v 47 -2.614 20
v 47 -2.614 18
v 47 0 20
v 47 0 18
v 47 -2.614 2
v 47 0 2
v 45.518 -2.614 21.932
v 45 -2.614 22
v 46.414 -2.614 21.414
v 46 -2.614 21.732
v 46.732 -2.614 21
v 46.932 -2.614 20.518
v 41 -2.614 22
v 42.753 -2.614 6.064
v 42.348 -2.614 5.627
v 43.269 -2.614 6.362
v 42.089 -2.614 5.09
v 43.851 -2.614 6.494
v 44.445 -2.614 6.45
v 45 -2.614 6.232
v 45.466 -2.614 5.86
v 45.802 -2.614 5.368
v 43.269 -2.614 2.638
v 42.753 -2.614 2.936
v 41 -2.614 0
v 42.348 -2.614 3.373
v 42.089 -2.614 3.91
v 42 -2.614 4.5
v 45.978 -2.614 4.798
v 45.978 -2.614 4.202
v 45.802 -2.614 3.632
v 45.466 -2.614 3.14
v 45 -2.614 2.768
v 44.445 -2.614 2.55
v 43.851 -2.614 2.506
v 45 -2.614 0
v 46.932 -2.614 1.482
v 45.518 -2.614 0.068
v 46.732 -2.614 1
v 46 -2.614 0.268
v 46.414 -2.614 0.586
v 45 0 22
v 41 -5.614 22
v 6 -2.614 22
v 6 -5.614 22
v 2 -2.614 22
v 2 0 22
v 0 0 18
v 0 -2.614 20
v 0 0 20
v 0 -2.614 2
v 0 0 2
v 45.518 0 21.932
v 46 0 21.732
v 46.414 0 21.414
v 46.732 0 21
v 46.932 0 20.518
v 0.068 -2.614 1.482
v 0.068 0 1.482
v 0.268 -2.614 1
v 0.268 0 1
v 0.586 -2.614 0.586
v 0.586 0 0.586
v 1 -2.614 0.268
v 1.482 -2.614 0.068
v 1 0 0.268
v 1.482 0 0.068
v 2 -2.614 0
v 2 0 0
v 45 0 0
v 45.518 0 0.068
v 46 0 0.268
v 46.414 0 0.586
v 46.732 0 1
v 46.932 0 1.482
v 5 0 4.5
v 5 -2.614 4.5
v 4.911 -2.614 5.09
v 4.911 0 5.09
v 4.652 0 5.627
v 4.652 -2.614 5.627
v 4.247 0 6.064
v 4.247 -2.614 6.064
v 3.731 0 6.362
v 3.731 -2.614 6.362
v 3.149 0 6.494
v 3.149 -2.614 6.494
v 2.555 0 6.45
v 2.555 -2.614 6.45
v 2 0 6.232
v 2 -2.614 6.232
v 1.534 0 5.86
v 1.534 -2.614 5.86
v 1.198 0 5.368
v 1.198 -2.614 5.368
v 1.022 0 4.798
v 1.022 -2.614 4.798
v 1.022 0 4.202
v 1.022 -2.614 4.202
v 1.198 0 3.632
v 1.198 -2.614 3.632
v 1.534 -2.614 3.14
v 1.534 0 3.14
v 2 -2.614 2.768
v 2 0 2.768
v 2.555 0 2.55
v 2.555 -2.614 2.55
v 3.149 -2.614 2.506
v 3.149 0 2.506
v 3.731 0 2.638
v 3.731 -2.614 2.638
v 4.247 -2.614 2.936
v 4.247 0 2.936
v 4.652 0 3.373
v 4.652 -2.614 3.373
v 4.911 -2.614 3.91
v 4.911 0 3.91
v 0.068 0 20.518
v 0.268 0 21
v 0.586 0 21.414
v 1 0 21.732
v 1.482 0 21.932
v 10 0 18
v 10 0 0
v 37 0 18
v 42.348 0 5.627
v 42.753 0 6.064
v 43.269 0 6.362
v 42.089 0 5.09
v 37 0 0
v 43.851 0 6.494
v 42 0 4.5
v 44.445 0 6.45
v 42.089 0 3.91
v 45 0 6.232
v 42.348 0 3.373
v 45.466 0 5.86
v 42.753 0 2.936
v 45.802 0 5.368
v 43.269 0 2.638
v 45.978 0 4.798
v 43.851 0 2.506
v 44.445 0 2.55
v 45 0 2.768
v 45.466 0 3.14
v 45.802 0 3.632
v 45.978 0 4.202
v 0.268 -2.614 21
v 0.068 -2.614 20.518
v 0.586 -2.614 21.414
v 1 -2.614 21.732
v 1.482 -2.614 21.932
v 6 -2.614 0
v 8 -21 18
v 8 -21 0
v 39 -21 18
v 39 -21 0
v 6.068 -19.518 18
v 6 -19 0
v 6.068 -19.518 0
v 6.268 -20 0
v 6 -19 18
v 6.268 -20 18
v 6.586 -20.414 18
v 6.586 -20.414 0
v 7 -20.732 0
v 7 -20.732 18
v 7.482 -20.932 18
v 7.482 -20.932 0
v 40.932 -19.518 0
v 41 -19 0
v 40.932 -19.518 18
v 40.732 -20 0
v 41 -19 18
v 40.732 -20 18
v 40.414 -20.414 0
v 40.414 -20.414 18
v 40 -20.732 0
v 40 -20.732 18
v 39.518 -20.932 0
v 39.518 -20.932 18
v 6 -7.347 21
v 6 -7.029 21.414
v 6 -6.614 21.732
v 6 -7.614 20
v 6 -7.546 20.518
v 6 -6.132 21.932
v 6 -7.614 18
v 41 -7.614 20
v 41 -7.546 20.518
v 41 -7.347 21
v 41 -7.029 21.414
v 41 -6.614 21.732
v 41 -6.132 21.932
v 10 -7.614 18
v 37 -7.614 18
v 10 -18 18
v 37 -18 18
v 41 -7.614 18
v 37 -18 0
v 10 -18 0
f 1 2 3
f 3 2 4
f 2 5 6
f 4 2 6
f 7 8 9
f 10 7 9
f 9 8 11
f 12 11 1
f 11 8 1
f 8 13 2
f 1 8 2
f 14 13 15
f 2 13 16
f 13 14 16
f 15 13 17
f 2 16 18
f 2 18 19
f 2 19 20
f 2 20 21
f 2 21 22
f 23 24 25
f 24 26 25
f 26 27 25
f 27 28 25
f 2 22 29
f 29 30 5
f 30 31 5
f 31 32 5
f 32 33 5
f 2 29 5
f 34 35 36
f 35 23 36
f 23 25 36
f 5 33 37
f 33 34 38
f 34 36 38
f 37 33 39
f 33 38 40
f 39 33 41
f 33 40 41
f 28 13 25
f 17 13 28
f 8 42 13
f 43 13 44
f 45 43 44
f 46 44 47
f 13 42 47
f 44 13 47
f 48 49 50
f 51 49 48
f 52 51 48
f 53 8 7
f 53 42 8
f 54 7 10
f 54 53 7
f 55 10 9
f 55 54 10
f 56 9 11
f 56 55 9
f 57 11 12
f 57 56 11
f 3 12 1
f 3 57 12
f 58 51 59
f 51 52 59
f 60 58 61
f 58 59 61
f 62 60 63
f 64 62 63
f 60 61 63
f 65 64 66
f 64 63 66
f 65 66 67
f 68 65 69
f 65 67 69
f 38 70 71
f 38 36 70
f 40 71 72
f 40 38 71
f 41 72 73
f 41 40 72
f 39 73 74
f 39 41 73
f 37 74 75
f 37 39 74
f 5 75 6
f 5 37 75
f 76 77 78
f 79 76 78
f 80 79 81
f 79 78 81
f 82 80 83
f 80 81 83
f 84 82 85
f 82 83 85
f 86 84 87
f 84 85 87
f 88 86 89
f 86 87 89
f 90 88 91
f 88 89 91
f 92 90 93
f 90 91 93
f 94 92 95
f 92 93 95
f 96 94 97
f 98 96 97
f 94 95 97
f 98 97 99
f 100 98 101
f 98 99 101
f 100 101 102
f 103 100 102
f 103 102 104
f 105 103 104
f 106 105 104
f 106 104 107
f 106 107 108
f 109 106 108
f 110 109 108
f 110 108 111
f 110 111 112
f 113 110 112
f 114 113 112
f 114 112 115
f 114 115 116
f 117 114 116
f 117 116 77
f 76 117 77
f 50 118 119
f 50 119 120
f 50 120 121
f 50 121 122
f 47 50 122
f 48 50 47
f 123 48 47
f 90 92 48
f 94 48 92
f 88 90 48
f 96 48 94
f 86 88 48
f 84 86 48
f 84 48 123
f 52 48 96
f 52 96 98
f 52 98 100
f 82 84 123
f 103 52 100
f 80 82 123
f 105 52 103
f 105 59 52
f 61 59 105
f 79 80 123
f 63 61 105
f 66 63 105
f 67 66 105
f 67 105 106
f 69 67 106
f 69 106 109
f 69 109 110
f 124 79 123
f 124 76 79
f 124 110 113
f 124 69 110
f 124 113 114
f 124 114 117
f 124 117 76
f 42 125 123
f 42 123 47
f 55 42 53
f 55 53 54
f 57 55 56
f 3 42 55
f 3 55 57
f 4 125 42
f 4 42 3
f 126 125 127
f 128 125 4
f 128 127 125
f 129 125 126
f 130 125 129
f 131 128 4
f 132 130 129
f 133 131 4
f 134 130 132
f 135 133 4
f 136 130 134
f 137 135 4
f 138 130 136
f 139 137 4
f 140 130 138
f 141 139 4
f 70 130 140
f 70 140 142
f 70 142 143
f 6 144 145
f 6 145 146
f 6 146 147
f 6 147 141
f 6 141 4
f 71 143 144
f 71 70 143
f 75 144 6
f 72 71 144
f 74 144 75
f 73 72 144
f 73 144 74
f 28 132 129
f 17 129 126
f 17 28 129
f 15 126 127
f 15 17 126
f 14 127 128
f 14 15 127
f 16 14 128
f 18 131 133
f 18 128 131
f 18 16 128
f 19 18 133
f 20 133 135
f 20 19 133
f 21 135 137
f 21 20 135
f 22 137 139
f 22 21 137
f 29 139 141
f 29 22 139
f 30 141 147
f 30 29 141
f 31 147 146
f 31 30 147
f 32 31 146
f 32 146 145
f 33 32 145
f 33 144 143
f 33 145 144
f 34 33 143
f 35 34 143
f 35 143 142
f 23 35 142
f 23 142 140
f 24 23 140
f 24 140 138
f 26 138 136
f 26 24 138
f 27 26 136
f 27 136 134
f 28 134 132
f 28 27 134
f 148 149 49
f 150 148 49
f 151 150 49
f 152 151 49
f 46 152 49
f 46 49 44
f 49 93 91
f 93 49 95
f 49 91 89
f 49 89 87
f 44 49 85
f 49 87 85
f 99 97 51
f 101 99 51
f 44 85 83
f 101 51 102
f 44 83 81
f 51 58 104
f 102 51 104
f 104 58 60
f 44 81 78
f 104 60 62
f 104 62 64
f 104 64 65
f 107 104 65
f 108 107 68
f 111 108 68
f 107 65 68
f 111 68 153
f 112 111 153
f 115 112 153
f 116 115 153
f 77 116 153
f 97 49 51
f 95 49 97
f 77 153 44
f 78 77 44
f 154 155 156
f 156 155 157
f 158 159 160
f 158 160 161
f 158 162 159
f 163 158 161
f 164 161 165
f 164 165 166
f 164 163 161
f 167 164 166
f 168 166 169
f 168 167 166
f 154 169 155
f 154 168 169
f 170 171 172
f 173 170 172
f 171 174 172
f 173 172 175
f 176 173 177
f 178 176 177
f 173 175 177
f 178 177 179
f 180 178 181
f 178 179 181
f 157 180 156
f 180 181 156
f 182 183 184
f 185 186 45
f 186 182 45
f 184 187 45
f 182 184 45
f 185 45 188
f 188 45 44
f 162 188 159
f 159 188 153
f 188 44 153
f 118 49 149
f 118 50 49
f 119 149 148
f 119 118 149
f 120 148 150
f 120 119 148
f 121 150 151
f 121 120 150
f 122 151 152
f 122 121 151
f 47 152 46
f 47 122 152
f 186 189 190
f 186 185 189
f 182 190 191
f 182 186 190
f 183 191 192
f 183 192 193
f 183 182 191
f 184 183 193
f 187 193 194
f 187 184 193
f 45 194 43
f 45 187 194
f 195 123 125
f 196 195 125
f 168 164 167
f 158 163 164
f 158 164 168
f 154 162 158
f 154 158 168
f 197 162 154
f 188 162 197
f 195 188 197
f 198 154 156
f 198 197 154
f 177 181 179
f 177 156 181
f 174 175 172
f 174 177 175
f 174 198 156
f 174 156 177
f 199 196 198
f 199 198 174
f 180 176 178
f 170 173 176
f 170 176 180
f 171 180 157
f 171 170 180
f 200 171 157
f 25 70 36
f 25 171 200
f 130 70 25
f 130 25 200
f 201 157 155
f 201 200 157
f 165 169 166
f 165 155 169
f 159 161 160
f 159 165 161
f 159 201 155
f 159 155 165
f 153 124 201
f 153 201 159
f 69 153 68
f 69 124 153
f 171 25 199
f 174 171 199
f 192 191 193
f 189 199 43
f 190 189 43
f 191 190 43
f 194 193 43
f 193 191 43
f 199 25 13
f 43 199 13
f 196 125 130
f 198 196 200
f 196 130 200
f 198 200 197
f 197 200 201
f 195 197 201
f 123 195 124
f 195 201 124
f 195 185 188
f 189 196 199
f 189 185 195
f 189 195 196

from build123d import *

# Parameters (mm, degrees)
BOSS_EXTRUDE1_DEPTH = 9
SKETCH2_R           = 2
CUT_EXTRUDE1_DEPTH  = 9
BOSS_EXTRUDE2_DEPTH = 9
SKETCH5_W           = 47
SKETCH5_H           = 2.614456703
BOSS_EXTRUDE3_DEPTH = 4
FILLET1_R           = 2
FILLET4_R           = 2
BOSS_EXTRUDE5_DEPTH = 5
FILLET5_R           = 2


with BuildPart() as part:
    # Sketch1 → Boss-Extrude1 (new body)
    with BuildSketch(Plane.XY):
        Polygon((0, 0), (10, 0), (10, -18), (37, -18), (37, 0), (47, 0), (47, -2.614456703), (41, -2.614456703), (41, -21), (6, -21), (6, -2.614456703), (0, -2.614456703), align=None)
    extrude(amount=BOSS_EXTRUDE1_DEPTH)

    # Sketch2 → Cut-Extrude1 (cut)
    with BuildSketch(Plane.XZ.offset(2.614456703)):
        with Locations((3, 4.5)):
            Circle(SKETCH2_R)
    cut_extrude1 = extrude(amount=-CUT_EXTRUDE1_DEPTH, mode=Mode.SUBTRACT)

    # Mirror1: Cut-Extrude1 across plane
    add(cut_extrude1.mirror(Plane(origin=(23.5, 0, 0), x_dir=(0, 0, 1), z_dir=(1, 0, 0))), mode=Mode.SUBTRACT)

    # Sketch3 → Boss-Extrude2 (add)
    with BuildSketch(Plane.XY.offset(9)):
        Polygon((0, 0), (0, -2.614456703), (6, -2.614456703), (6, -21), (41, -21), (41, -2.614456703), (47, -2.614456703), (47, 0), (37, 0), (37, -18), (10, -18), (10, 0), align=None)
    extrude(amount=BOSS_EXTRUDE2_DEPTH)

    # Sketch5 → Boss-Extrude3 (add)
    with BuildSketch(Plane.XY.offset(18)):
        with Locations((23.5, -1.307228352)):
            Rectangle(SKETCH5_W, SKETCH5_H)
    extrude(amount=BOSS_EXTRUDE3_DEPTH)

    # Fillet1
    fillet1_edges = [part.edges().sort_by_distance(p)[0] for p in [
        (0, -1.307228352, 22),
        (47, -1.307228352, 22),
    ]]
    fillet(fillet1_edges, radius=FILLET1_R)

    # Fillet4
    fillet4_edges = [part.edges().sort_by_distance(p)[0] for p in [
        (47, -1.307228352, 0),
        (0, -1.307228352, 0),
        (41, -21, 9),
        (6, -21, 9),
    ]]
    fillet(fillet4_edges, radius=FILLET4_R)

    # Sketch9 → Boss-Extrude5 (add)
    with BuildSketch(Plane.XZ.offset(2.614456703)):
        Polygon((6, 22), (6, 18), (10, 18), (37, 18), (41, 18), (41, 22), align=None)
    extrude(amount=BOSS_EXTRUDE5_DEPTH)

    # Fillet5
    fillet5_edges = [part.edges().sort_by_distance(p)[0] for p in [
        (23.5, -7.614456703, 22),
    ]]
    fillet(fillet5_edges, radius=FILLET5_R)


solid = part.part
